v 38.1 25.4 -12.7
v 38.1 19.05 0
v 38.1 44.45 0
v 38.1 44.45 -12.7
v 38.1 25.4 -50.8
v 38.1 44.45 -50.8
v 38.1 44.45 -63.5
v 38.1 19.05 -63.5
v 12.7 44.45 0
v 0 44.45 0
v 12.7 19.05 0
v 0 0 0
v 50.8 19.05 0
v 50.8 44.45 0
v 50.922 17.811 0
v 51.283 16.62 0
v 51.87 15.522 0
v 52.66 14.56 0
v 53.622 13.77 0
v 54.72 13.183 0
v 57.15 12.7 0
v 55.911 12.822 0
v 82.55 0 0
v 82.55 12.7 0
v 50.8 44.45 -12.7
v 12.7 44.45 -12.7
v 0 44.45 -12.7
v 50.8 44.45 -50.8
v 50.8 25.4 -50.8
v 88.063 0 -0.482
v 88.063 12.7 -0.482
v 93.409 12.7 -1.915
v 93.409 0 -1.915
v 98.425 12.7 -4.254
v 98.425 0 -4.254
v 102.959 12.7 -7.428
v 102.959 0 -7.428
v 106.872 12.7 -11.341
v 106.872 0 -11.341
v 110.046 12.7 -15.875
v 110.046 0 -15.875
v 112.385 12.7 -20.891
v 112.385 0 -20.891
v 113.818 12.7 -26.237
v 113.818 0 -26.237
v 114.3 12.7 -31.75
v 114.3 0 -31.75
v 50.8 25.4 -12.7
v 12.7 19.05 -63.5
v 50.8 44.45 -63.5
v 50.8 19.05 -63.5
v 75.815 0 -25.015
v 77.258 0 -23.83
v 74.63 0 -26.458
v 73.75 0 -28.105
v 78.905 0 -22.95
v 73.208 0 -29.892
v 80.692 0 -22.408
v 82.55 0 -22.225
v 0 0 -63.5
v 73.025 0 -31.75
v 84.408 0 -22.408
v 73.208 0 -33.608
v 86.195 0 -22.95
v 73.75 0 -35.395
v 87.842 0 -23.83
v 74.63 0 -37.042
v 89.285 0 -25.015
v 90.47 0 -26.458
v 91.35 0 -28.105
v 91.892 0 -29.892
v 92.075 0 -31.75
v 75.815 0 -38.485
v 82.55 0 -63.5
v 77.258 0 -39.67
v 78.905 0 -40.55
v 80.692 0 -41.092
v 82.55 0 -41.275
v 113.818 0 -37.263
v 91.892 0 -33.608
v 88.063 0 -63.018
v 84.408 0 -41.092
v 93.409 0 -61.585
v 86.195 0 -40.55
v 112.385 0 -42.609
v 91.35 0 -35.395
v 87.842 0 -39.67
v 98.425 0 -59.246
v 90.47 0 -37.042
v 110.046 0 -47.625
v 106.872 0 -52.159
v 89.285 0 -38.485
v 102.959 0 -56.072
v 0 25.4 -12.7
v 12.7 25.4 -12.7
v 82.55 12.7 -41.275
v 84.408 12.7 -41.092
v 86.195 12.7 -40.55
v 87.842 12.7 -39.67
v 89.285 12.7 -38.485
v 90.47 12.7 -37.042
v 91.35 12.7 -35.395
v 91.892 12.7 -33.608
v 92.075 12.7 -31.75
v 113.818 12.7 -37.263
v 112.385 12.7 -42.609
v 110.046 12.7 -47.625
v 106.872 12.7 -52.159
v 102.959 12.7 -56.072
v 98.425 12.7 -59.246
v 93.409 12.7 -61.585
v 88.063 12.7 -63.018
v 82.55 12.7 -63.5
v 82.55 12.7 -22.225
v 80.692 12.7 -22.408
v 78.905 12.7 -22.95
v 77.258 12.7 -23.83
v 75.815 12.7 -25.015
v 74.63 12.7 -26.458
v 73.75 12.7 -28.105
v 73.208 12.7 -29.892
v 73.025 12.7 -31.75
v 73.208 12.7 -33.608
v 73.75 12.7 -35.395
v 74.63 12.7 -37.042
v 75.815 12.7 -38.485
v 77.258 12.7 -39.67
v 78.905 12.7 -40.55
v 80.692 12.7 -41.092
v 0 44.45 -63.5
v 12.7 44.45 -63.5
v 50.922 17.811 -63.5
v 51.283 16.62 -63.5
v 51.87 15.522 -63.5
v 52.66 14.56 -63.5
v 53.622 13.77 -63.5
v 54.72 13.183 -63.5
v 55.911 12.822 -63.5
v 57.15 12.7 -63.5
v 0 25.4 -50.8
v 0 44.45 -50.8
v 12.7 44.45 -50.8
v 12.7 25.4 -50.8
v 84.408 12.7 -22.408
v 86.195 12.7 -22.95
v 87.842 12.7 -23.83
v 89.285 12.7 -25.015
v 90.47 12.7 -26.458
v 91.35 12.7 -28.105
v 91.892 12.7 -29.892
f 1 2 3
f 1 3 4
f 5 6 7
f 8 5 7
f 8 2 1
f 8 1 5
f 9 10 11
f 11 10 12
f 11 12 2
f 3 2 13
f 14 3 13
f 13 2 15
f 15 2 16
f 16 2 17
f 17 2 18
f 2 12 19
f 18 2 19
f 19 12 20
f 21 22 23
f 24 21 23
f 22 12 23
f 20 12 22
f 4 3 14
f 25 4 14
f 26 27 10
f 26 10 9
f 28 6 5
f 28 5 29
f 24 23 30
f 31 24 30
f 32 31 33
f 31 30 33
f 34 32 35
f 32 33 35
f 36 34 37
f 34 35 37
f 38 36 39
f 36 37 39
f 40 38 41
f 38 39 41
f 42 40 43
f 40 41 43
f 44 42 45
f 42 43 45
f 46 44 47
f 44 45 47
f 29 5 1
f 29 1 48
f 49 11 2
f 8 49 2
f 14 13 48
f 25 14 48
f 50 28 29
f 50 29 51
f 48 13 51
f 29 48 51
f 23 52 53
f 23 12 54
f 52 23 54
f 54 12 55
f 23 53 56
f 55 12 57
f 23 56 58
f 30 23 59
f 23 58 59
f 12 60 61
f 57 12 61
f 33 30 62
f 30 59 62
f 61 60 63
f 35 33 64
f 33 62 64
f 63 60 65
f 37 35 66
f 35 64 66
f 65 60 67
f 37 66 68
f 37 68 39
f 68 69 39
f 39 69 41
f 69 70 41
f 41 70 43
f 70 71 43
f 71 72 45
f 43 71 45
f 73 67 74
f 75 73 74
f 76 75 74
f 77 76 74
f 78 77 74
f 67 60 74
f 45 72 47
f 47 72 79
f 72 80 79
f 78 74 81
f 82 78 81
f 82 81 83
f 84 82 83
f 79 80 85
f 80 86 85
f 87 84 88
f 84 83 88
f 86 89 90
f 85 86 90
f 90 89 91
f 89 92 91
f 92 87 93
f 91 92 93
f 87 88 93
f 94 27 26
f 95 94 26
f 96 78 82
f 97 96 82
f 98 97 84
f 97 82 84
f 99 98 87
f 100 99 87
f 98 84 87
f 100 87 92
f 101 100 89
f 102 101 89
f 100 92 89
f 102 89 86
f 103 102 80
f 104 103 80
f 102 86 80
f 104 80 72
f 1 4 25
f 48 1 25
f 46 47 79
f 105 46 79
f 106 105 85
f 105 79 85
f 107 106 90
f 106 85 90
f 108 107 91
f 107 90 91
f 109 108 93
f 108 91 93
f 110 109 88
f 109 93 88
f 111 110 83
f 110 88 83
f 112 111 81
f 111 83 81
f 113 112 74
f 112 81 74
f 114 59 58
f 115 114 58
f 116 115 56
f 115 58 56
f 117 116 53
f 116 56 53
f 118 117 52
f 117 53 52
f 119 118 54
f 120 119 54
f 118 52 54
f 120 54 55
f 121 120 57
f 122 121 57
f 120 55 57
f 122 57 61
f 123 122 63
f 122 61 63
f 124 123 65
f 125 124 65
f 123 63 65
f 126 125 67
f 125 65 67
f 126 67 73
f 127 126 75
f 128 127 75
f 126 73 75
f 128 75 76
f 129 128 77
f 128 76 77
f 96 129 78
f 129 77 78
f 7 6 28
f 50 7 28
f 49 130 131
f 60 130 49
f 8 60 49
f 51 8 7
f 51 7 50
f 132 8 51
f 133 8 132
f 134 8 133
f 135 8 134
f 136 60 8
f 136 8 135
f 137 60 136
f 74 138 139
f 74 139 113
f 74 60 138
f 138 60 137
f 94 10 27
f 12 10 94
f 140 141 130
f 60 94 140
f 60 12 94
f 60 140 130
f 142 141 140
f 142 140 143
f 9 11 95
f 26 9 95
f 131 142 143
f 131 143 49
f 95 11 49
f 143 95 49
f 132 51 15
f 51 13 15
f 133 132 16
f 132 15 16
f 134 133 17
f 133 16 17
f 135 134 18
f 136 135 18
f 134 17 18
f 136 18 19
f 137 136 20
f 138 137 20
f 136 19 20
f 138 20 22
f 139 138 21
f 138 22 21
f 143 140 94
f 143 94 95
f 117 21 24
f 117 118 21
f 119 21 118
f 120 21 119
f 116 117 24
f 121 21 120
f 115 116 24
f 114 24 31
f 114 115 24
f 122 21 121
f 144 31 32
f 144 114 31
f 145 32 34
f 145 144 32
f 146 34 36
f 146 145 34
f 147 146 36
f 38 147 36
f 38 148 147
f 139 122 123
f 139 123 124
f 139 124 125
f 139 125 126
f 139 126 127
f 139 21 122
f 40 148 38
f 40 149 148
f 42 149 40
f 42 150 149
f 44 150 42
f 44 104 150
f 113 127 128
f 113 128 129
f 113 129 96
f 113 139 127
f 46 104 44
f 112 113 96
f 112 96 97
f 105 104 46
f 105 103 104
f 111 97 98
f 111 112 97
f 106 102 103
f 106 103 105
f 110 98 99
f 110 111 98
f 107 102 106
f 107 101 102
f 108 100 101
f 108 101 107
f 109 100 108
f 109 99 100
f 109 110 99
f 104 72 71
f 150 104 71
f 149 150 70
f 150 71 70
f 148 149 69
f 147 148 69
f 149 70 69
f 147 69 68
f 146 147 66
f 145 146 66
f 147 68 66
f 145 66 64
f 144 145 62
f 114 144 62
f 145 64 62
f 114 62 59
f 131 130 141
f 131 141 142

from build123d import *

# Parameters (mm, degrees)
SKETCH1_R           = 9.525
BOSS_EXTRUDE1_DEPTH = 12.7
BOSS_EXTRUDE2_DEPTH = 19.05
SKETCH6_W           = 12.7
SKETCH6_H           = 12.7
BOSS_EXTRUDE3_DEPTH = 25.4
SKETCH6_3_W         = 12.7
SKETCH6_3_H         = 38.1
BOSS_EXTRUDE4_DEPTH = 6.35
FILLET1_R           = 6.35


with BuildPart() as part:
    # Sketch1 → Boss-Extrude1 (new body)
    with BuildSketch(Plane(origin=(0, 0, 0), x_dir=(1, 0, 0), z_dir=(0, 1, 0))):
        with BuildLine():
            Line((82.55, 63.5), (50.8, 63.5))
            Line((50.8, 63.5), (50.8, 0))
            Line((50.8, 0), (82.55, 0))
            ThreePointArc((82.55, 0), (114.3, 31.75), (82.55, 63.5))
        make_face()
        with Locations((82.55, 31.75)):
            Circle(SKETCH1_R, mode=Mode.SUBTRACT)
    extrude(amount=BOSS_EXTRUDE1_DEPTH)

    # Sketch1<4> → Boss-Extrude2 (add)
    with BuildSketch(Plane(origin=(0, 0, 0), x_dir=(1, 0, 0), z_dir=(0, 1, 0))):
        Polygon((50.8, 31.749999876), (50.8, 63.5), (0, 63.5), (0, 0), (50.8, 0), align=None)
    extrude(amount=BOSS_EXTRUDE2_DEPTH)

    # Sketch6 → Boss-Extrude3 (add)
    with BuildSketch(Plane(origin=(0, 19.05, 0), x_dir=(1, 0, 0), z_dir=(0, 1, 0))):
        with Locations((6.35, 57.15)):
            Rectangle(SKETCH6_W, SKETCH6_H)
        with Locations((44.45, 57.15)):
            Rectangle(SKETCH6_W, SKETCH6_H)
        with Locations((6.35, 6.35)):
            Rectangle(SKETCH6_W, SKETCH6_H)
        with Locations((44.45, 6.35)):
            Rectangle(SKETCH6_W, SKETCH6_H)
    extrude(amount=BOSS_EXTRUDE3_DEPTH)

    # Sketch6<3> → Boss-Extrude4 (add)
    with BuildSketch(Plane(origin=(0, 19.05, 0), x_dir=(1, 0, 0), z_dir=(0, 1, 0))):
        with Locations((6.35, 31.75)):
            Rectangle(SKETCH6_3_W, SKETCH6_3_H)
        with Locations((44.45, 31.75)):
            Rectangle(SKETCH6_3_W, SKETCH6_3_H)
    extrude(amount=BOSS_EXTRUDE4_DEPTH)

    # Fillet1
    fillet1_edges = [part.edges().sort_by_distance(p)[0] for p in [
        (50.8, 12.7, -31.75),
    ]]
    fillet(fillet1_edges, radius=FILLET1_R)


solid = part.part
